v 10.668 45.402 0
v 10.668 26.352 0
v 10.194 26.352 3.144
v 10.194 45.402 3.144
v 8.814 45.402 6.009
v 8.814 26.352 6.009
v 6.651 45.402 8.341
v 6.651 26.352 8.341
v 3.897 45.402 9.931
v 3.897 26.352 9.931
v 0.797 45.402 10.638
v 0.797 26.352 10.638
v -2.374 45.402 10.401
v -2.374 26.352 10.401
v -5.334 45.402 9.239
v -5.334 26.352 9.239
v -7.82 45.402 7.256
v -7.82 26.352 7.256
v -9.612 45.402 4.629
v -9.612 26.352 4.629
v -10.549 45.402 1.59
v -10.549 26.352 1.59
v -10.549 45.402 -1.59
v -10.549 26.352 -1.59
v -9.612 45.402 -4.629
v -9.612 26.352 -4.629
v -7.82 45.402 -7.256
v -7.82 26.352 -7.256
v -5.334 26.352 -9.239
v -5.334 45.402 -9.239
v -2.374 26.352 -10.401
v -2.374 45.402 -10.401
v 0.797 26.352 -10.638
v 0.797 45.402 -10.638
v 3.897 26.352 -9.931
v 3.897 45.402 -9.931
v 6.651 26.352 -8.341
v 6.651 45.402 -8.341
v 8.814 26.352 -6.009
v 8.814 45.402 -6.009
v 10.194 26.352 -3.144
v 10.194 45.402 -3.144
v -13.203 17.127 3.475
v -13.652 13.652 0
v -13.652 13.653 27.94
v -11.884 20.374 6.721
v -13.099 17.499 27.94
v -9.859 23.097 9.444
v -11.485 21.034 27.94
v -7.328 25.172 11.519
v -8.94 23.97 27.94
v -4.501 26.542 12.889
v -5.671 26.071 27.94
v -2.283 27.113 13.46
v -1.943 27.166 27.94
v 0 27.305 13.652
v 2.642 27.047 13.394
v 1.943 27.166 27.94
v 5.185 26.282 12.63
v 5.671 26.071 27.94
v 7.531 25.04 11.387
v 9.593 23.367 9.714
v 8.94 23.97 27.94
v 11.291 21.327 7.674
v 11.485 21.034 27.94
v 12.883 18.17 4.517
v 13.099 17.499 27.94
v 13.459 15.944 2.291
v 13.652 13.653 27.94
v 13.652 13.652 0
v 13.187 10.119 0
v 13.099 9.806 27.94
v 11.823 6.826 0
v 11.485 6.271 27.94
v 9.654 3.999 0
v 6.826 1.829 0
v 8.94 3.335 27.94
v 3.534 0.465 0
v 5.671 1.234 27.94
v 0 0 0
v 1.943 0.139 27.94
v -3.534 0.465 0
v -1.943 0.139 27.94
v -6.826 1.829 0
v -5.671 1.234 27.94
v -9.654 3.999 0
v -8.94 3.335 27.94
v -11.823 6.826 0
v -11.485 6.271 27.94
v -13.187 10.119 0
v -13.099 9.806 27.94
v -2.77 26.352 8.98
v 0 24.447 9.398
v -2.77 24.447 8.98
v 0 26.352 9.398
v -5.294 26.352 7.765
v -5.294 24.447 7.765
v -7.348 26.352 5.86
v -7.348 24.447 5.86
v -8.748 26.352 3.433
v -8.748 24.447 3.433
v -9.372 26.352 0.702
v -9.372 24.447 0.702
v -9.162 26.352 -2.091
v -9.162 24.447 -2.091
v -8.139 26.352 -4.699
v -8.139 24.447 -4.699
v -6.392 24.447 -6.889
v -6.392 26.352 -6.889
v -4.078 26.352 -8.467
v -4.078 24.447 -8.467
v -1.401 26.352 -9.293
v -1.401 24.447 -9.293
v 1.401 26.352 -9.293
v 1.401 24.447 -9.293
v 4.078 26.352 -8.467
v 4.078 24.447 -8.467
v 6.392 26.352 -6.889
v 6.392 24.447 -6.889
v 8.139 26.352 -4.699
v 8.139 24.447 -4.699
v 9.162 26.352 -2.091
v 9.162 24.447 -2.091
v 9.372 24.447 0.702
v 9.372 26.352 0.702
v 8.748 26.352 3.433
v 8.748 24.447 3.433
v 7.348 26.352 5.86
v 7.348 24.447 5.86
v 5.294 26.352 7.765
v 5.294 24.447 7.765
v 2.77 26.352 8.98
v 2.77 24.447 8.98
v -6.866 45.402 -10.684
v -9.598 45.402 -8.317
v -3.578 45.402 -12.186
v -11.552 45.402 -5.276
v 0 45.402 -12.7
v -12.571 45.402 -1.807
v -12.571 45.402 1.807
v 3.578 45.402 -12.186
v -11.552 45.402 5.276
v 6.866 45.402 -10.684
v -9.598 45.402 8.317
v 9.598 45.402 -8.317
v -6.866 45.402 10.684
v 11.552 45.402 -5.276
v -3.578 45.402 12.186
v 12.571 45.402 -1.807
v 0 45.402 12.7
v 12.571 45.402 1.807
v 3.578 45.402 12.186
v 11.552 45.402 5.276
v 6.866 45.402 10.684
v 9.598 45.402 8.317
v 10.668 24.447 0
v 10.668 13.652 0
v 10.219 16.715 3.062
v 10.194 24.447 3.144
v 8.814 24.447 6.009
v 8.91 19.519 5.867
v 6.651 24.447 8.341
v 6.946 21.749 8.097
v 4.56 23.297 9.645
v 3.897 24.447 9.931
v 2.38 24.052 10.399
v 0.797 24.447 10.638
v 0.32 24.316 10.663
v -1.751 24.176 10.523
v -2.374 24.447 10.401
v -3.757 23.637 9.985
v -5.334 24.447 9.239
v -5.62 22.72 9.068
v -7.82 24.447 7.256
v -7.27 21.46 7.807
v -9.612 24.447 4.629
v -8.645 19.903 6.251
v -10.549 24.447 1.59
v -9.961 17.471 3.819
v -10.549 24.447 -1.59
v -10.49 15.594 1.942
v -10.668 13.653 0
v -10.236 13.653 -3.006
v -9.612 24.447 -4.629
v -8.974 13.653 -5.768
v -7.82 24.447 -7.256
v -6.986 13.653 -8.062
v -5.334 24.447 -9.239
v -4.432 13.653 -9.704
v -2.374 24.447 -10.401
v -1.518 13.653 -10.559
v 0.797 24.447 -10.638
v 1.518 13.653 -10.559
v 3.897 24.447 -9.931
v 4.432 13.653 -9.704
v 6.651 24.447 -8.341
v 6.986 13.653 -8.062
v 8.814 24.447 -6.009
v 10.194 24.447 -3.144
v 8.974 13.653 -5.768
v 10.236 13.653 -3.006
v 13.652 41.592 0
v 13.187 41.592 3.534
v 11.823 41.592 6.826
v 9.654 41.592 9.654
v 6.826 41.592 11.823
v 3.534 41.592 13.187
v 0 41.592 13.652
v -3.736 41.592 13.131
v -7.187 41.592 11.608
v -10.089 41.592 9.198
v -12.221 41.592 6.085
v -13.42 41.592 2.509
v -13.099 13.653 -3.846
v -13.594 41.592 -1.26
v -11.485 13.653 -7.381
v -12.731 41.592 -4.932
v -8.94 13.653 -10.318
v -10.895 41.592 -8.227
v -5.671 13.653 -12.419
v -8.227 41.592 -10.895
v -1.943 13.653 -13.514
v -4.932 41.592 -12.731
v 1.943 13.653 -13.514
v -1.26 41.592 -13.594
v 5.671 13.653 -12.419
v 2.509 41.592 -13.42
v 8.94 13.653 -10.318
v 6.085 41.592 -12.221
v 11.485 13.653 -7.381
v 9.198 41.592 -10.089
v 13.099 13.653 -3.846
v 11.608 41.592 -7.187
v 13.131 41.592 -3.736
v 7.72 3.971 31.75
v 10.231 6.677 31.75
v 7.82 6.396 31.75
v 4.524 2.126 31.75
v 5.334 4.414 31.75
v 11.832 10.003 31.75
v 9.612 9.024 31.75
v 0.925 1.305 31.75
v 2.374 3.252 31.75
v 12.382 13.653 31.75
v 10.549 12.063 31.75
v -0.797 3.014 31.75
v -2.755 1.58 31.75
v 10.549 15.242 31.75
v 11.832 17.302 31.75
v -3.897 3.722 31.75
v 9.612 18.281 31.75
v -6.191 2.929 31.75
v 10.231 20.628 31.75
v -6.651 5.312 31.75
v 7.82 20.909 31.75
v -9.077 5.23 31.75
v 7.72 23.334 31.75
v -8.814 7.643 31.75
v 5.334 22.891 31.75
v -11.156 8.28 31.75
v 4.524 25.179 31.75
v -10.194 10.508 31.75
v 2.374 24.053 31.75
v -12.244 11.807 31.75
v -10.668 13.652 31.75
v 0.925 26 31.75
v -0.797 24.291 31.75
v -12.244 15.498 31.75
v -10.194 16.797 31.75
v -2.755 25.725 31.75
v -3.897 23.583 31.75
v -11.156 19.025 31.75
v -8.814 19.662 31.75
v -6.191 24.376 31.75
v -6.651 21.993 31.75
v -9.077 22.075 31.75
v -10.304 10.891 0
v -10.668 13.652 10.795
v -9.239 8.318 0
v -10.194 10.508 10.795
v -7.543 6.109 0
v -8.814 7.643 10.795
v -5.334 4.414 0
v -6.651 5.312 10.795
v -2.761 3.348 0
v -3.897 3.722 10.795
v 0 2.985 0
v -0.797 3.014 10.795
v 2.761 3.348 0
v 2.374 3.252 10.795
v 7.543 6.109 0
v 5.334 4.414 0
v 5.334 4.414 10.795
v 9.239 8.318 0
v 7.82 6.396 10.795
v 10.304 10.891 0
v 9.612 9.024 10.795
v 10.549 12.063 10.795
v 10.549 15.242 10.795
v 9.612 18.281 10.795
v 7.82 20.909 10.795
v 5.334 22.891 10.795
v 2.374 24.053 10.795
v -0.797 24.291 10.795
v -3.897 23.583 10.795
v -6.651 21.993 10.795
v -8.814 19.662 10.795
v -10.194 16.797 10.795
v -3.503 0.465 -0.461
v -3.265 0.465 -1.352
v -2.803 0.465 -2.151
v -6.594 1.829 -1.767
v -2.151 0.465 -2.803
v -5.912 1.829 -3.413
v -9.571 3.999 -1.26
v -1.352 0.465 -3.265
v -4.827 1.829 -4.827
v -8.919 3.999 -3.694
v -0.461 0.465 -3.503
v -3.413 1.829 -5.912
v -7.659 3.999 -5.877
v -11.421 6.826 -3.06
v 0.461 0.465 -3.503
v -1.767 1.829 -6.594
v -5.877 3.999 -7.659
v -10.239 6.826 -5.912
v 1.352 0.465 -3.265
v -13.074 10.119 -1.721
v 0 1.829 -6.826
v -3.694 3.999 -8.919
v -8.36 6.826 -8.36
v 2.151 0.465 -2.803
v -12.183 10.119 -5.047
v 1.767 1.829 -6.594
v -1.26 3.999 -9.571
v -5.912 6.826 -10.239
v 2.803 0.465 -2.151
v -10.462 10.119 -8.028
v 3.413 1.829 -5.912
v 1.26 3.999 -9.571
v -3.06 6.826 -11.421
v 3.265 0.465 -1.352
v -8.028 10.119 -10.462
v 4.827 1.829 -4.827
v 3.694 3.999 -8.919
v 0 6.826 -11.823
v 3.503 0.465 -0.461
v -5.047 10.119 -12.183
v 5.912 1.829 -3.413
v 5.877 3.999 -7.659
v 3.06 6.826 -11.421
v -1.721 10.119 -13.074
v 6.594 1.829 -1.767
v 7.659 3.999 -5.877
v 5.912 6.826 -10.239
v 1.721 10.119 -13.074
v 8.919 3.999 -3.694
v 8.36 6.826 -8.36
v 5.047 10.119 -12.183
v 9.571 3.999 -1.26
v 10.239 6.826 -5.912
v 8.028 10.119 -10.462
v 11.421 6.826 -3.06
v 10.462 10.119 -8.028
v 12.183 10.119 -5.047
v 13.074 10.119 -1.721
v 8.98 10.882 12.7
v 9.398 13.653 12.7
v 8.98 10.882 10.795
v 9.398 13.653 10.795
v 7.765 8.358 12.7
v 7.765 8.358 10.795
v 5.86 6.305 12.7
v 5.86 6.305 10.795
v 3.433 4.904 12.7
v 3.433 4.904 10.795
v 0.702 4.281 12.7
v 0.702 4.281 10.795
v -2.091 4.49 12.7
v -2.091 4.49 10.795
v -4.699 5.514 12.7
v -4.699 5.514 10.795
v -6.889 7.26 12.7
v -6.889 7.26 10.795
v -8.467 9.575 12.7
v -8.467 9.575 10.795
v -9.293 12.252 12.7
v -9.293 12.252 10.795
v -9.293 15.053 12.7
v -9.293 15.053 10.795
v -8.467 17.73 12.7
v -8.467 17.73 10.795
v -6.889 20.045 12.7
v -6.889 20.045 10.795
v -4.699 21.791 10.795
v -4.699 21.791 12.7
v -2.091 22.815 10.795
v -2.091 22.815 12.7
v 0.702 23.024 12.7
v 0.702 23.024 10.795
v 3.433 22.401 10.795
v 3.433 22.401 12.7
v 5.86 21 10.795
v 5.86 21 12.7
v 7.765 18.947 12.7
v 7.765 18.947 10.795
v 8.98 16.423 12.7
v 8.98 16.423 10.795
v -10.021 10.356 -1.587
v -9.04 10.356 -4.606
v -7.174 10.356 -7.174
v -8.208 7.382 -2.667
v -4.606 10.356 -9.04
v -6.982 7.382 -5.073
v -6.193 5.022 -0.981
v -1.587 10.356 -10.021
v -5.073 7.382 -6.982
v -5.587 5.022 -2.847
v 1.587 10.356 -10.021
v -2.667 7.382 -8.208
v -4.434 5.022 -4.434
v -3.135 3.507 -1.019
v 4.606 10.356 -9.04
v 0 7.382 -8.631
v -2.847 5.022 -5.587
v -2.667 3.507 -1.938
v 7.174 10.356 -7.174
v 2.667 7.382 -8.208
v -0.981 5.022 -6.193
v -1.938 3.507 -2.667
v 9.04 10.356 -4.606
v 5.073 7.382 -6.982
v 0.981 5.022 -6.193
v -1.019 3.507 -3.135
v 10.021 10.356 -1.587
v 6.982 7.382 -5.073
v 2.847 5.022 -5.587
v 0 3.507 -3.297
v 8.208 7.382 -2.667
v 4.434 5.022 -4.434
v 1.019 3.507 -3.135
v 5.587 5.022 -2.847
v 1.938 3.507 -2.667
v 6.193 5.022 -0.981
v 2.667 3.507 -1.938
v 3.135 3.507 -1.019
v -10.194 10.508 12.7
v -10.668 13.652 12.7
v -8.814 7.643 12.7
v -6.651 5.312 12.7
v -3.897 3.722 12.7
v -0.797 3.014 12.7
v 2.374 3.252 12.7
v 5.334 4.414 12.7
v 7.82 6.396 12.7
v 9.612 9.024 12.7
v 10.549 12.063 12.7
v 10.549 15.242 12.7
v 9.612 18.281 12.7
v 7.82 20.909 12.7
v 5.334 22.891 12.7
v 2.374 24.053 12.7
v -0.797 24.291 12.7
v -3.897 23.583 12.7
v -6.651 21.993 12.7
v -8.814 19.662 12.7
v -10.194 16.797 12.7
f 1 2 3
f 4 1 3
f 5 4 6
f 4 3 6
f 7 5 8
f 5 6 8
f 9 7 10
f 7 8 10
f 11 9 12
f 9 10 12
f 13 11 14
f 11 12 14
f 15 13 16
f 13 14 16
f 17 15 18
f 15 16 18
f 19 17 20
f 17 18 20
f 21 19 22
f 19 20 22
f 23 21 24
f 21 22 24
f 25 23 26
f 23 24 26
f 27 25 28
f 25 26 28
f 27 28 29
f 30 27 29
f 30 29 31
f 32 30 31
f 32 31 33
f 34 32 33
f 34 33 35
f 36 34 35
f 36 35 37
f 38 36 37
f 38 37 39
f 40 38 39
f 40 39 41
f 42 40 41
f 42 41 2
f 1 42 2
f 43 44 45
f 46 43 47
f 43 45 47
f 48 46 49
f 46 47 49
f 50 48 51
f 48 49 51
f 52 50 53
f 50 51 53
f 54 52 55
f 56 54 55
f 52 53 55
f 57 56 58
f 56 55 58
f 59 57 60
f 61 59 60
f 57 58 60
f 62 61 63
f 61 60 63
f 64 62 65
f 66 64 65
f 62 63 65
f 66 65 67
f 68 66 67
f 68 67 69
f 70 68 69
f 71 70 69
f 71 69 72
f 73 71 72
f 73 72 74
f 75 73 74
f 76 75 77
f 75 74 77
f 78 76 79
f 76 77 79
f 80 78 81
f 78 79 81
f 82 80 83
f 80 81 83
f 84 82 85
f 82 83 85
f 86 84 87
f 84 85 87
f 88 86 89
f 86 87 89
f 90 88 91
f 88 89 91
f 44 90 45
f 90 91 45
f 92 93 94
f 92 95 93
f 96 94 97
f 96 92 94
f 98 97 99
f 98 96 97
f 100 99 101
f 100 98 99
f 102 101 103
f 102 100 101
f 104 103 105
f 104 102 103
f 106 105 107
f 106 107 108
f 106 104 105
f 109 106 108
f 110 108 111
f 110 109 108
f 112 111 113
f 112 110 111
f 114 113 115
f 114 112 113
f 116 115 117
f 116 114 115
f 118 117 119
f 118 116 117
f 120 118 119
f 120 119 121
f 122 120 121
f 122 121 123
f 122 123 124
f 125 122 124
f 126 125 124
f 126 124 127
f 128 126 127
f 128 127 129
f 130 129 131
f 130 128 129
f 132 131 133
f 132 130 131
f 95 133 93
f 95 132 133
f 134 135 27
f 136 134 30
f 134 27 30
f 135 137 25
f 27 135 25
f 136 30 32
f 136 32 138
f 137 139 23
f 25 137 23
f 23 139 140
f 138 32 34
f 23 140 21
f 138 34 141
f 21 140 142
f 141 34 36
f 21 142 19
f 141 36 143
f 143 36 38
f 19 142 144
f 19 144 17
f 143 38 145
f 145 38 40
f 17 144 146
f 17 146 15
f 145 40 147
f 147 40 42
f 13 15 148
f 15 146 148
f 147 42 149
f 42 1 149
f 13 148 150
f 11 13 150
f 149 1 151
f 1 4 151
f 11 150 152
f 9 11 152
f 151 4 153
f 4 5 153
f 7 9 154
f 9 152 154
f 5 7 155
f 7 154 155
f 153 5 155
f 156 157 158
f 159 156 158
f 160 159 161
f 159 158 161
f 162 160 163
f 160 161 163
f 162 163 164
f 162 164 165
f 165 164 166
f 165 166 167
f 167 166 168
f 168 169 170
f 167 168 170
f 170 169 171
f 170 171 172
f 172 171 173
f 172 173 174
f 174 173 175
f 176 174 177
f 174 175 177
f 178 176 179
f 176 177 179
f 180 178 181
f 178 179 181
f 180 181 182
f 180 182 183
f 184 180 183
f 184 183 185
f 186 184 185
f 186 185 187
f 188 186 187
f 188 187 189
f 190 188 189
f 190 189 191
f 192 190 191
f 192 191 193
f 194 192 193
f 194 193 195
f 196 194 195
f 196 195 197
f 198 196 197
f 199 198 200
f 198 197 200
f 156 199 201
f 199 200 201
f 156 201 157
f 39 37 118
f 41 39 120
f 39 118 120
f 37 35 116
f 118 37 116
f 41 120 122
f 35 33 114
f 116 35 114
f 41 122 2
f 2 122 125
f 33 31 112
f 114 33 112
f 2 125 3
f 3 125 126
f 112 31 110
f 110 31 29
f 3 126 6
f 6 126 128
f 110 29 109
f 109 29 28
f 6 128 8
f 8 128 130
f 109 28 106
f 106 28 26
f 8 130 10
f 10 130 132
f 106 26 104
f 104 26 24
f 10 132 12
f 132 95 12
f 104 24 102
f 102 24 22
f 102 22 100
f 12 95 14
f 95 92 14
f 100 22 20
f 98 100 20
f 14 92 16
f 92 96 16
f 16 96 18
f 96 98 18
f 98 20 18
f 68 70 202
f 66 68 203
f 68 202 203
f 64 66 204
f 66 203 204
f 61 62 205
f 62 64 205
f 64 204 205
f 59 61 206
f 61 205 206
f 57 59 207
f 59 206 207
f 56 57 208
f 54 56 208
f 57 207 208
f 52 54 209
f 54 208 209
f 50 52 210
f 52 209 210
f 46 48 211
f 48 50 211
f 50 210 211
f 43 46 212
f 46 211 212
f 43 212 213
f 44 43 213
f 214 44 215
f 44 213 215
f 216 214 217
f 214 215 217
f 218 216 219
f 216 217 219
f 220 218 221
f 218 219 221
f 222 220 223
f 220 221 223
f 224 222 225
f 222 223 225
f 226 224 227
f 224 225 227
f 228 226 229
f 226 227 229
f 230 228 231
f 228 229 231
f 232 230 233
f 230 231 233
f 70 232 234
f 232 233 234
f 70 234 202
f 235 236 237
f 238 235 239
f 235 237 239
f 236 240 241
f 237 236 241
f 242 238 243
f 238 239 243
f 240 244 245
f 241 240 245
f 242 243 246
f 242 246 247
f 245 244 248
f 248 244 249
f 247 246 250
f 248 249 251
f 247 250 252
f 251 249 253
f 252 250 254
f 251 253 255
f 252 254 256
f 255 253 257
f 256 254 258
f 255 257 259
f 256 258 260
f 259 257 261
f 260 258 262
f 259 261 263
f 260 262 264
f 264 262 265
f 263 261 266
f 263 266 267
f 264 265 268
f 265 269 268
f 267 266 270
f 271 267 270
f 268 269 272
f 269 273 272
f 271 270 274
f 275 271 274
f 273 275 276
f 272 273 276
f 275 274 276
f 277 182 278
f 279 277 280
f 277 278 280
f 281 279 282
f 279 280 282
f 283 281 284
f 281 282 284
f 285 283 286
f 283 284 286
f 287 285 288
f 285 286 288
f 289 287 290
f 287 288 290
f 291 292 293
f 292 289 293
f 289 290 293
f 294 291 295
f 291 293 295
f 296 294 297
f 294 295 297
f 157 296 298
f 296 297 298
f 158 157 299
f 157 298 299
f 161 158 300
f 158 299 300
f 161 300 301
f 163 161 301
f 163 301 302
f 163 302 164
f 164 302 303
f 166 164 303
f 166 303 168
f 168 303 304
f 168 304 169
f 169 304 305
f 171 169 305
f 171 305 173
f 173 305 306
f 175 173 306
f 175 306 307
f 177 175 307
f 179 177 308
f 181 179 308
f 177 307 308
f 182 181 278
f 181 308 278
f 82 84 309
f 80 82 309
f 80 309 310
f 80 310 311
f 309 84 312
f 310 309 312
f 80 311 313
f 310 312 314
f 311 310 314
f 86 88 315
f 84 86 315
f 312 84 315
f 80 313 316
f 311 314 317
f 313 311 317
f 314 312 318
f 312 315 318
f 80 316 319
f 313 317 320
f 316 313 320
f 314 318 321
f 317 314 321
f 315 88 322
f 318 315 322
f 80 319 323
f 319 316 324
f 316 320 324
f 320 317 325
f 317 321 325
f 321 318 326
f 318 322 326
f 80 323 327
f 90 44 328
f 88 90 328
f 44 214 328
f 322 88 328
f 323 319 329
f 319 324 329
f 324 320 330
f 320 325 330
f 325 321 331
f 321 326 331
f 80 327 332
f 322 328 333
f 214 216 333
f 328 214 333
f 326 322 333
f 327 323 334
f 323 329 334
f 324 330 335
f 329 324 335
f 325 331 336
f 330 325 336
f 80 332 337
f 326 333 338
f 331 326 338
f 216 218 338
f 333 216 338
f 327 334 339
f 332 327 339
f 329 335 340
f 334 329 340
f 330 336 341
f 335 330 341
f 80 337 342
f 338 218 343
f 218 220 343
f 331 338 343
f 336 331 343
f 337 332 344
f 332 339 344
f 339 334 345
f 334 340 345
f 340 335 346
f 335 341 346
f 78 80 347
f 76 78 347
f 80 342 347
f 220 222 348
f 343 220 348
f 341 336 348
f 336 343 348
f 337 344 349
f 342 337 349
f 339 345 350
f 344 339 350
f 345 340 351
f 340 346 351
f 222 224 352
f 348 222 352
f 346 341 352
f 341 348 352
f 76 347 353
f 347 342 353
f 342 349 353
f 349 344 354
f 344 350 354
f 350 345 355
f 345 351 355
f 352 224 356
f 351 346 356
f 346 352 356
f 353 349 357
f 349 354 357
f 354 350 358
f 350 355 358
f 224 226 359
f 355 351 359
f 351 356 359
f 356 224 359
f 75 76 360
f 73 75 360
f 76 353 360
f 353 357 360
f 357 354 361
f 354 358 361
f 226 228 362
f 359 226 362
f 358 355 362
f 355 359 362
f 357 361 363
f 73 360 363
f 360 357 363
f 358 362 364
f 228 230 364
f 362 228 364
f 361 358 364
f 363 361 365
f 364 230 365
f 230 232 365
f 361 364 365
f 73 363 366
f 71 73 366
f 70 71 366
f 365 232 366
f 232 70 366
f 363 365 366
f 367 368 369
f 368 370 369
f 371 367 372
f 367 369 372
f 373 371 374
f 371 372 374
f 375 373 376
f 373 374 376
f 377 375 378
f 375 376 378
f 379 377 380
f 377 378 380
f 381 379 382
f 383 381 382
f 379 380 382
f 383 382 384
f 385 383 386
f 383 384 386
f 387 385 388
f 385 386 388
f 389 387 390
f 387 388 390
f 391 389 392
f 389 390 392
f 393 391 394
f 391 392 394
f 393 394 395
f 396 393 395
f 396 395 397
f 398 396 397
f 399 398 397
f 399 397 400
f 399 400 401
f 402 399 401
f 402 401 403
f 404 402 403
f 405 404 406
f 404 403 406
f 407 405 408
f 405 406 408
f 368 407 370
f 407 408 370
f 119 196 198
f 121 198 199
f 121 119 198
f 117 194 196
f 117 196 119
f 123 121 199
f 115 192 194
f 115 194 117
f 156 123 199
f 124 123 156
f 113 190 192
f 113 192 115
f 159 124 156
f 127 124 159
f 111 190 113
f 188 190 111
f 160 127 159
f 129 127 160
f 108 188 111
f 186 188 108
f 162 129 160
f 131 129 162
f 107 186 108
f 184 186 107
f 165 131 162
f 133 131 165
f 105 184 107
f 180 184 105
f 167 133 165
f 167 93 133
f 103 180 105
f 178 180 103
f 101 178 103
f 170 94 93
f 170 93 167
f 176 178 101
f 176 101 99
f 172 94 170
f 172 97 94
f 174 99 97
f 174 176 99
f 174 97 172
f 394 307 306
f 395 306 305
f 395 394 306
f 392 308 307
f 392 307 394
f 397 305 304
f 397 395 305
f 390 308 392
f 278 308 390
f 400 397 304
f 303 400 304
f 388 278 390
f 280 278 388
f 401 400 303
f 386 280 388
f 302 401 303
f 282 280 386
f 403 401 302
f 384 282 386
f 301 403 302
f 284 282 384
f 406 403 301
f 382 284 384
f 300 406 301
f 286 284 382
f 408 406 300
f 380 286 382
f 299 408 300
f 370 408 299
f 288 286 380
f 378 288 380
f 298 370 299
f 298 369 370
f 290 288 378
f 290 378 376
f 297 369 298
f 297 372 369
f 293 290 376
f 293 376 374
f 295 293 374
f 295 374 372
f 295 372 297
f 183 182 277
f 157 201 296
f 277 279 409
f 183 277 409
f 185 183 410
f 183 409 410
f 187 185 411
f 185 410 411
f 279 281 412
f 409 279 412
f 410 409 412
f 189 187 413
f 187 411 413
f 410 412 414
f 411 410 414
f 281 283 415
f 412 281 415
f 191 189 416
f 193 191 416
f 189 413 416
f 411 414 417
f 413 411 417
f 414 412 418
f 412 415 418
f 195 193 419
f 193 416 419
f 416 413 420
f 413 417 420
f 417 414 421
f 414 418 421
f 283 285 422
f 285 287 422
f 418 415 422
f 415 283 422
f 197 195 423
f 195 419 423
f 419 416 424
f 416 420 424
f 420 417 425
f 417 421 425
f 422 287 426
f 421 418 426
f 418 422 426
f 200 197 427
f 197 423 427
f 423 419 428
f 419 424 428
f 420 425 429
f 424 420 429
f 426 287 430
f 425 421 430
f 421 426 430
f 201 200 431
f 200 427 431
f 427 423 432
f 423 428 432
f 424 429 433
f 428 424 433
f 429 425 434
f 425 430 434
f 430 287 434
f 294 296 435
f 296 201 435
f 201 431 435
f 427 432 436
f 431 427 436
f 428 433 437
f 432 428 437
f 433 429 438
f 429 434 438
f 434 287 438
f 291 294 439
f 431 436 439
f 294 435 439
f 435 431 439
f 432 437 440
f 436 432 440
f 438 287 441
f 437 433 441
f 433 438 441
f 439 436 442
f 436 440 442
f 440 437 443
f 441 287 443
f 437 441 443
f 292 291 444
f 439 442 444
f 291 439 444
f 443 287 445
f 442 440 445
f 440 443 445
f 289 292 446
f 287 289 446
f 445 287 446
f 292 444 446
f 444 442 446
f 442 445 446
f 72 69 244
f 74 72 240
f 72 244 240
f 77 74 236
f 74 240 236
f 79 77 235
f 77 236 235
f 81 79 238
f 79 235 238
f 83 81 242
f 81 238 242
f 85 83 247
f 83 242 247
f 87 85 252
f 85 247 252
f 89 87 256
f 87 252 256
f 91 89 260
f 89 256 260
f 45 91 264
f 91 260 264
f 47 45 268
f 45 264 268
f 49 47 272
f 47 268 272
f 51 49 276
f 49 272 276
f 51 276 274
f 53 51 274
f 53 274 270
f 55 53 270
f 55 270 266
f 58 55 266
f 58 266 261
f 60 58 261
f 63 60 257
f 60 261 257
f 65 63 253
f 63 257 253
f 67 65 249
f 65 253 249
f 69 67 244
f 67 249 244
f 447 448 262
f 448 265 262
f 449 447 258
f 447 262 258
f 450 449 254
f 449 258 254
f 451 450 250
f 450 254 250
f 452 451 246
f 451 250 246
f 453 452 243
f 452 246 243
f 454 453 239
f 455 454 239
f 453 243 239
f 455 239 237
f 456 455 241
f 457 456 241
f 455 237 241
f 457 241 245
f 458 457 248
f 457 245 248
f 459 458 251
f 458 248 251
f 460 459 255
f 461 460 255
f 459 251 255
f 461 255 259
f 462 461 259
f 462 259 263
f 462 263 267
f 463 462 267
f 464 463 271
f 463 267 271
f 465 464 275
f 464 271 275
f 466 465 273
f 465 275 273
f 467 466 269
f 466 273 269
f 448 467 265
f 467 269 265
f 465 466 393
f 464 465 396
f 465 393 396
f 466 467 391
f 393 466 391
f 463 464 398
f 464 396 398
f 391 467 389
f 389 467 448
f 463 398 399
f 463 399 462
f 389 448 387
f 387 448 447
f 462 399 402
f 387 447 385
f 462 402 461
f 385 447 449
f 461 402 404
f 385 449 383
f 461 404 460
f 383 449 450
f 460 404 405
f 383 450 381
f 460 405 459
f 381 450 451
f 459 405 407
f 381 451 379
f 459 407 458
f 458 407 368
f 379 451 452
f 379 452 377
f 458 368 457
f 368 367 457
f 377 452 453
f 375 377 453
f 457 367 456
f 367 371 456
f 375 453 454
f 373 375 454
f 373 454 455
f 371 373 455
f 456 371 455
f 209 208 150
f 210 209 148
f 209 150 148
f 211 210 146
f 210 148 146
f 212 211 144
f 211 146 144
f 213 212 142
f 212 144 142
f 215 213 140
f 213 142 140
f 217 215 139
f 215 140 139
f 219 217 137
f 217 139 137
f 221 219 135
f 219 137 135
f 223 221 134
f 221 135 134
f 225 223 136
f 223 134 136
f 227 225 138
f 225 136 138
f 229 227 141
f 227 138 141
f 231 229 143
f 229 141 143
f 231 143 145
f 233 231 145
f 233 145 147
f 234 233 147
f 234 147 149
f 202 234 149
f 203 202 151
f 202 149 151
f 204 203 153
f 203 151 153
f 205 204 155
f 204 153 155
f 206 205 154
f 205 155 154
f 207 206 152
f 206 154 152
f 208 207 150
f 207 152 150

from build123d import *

# Parameters (mm, degrees)
BOSS_EXTRUDE2_REACH      = 67.644
BOSS_EXTRUDE2_END_RADIUS = 13.6525
SKETCH5_R                = 13.6525
SKETCH5_R_2              = 10.668
SKETCH6_R                = 10.668
CUT_EXTRUDE1_DEPTH       = 43.688
CUT_EXTRUDE2_START       = 44.196
SKETCH7_R                = 10.668
CUT_EXTRUDE2_DEPTH       = 44.196
SKETCH8_W                = 1.27
SKETCH8_H                = 1.905
SKETCH9_W                = 1.905
SKETCH9_H                = 1.27


with BuildPart() as part:
    # Sketch2 → Revolve1 (revolve)
    with BuildSketch(Plane.XY):
        with BuildLine():
            Line((13.6525, 13.6525), (13.6525, 45.4025))
            Line((13.6525, 45.4025), (10.668, 45.4025))
            Line((10.668, 45.4025), (10.668, 13.6525))
            ThreePointArc((10.668, 13.6525), (7.543415142, 6.109084858), (0, 2.9845))
            Line((0, 2.9845), (0, 0))
            ThreePointArc((0, 0), (9.65377533, 3.99872467), (13.6525, 13.6525))
        make_face()
    revolve(axis=Axis((0, 50.454853333, 0), (0, -1, 0)))

    # Boss-Extrude2: up to this sphere (the profile starts outside it)
    boss_extrude2_end = Location((0, 13.6525, 0)) * Sphere(BOSS_EXTRUDE2_END_RADIUS, mode=Mode.PRIVATE)
    # Sketch5 → Boss-Extrude2 (add, up to the surface)
    with BuildSketch(Plane(origin=(0, 0, 31.75), x_dir=(-1, 0, 0), z_dir=(0, 0, -1)), mode=Mode.PRIVATE) as boss_extrude2_sk1:
        with Locations((0, 13.6525)):
            Circle(SKETCH5_R)
        with Locations((0, 13.6525)):
            Circle(SKETCH5_R_2, mode=Mode.SUBTRACT)
    boss_extrude2_tool1 = extrude(boss_extrude2_sk1.sketch, amount=BOSS_EXTRUDE2_REACH, mode=Mode.PRIVATE) - boss_extrude2_end
    add(boss_extrude2_tool1.solids().sort_by_distance((13.266349, 13.6525, 31.75))[0])

    # Sketch6 → Cut-Extrude1 (cut)
    with BuildSketch(Plane(origin=(0, 13.6525, 0), x_dir=(1, 0, 0), z_dir=(0, 1, 0))):
        with Locations(Location((0, 0, 0), (0, 0, 270))):
            Circle(SKETCH6_R)
    extrude(amount=CUT_EXTRUDE1_DEPTH, mode=Mode.SUBTRACT)

    # Sketch7 → Cut-Extrude2 (cut)
    with BuildSketch(Plane.XY.offset(CUT_EXTRUDE2_START)):
        with Locations(Location((0, 13.6525, 0), (0, 0, 180))):
            Circle(SKETCH7_R)
    extrude(amount=-CUT_EXTRUDE2_DEPTH, mode=Mode.SUBTRACT)

    # Sketch8 → Revolve2 (revolve)
    with BuildSketch(Plane.XY, mode=Mode.PRIVATE) as revolve2_sk:
        with Locations((-10.033, 25.4)):
            Rectangle(SKETCH8_W, SKETCH8_H)
    revolve(revolve2_sk.sketch.rotate(Axis((0, 45.4025, 0), (0, -1, 0)), 270), axis=Axis((0, 45.4025, 0), (0, -1, 0)))

    # Sketch9 → Revolve3 (revolve)
    with BuildSketch(Plane(origin=(0, 0, 0), x_dir=(0, 0, -1), z_dir=(1, 0, 0)), mode=Mode.PRIVATE) as revolve3_sk:
        with Locations((-11.7475, 3.6195)):
            Rectangle(SKETCH9_W, SKETCH9_H)
    revolve(revolve3_sk.sketch.rotate(Axis((0, 13.6525, 31.75), (0, 0, -1)), 270), axis=Axis((0, 13.6525, 31.75), (0, 0, -1)))

    # Sketch10 → Cut-Revolve1 (revolve, cut)
    with BuildSketch(Plane(origin=(0, 0, 0), x_dir=(0, 0, -1), z_dir=(1, 0, 0)), mode=Mode.PRIVATE) as cut_revolve1_sk:
        Polygon((13.6525, 45.4025), (13.6525, 41.5925), (12.7, 45.4025), align=None)
    revolve(cut_revolve1_sk.sketch.rotate(Axis((0, 45.4025, 0), (0, -1, 0)), 180), axis=Axis((0, 45.4025, 0), (0, -1, 0)), mode=Mode.SUBTRACT)

    # Sketch12 → Cut-Revolve2 (revolve, cut)
    with BuildSketch(Plane(origin=(0, 13.6525, 0), x_dir=(1, 0, 0), z_dir=(0, 1, 0)), mode=Mode.PRIVATE) as cut_revolve2_sk:
        Polygon((-13.6525, -31.75), (-13.6525, -27.94), (-12.3825, -31.75), align=None)
    revolve(cut_revolve2_sk.sketch.rotate(Axis((0, 13.6525, 31.75), (0, 0, -1)), 180), axis=Axis((0, 13.6525, 31.75), (0, 0, -1)), mode=Mode.SUBTRACT)


solid = part.part
